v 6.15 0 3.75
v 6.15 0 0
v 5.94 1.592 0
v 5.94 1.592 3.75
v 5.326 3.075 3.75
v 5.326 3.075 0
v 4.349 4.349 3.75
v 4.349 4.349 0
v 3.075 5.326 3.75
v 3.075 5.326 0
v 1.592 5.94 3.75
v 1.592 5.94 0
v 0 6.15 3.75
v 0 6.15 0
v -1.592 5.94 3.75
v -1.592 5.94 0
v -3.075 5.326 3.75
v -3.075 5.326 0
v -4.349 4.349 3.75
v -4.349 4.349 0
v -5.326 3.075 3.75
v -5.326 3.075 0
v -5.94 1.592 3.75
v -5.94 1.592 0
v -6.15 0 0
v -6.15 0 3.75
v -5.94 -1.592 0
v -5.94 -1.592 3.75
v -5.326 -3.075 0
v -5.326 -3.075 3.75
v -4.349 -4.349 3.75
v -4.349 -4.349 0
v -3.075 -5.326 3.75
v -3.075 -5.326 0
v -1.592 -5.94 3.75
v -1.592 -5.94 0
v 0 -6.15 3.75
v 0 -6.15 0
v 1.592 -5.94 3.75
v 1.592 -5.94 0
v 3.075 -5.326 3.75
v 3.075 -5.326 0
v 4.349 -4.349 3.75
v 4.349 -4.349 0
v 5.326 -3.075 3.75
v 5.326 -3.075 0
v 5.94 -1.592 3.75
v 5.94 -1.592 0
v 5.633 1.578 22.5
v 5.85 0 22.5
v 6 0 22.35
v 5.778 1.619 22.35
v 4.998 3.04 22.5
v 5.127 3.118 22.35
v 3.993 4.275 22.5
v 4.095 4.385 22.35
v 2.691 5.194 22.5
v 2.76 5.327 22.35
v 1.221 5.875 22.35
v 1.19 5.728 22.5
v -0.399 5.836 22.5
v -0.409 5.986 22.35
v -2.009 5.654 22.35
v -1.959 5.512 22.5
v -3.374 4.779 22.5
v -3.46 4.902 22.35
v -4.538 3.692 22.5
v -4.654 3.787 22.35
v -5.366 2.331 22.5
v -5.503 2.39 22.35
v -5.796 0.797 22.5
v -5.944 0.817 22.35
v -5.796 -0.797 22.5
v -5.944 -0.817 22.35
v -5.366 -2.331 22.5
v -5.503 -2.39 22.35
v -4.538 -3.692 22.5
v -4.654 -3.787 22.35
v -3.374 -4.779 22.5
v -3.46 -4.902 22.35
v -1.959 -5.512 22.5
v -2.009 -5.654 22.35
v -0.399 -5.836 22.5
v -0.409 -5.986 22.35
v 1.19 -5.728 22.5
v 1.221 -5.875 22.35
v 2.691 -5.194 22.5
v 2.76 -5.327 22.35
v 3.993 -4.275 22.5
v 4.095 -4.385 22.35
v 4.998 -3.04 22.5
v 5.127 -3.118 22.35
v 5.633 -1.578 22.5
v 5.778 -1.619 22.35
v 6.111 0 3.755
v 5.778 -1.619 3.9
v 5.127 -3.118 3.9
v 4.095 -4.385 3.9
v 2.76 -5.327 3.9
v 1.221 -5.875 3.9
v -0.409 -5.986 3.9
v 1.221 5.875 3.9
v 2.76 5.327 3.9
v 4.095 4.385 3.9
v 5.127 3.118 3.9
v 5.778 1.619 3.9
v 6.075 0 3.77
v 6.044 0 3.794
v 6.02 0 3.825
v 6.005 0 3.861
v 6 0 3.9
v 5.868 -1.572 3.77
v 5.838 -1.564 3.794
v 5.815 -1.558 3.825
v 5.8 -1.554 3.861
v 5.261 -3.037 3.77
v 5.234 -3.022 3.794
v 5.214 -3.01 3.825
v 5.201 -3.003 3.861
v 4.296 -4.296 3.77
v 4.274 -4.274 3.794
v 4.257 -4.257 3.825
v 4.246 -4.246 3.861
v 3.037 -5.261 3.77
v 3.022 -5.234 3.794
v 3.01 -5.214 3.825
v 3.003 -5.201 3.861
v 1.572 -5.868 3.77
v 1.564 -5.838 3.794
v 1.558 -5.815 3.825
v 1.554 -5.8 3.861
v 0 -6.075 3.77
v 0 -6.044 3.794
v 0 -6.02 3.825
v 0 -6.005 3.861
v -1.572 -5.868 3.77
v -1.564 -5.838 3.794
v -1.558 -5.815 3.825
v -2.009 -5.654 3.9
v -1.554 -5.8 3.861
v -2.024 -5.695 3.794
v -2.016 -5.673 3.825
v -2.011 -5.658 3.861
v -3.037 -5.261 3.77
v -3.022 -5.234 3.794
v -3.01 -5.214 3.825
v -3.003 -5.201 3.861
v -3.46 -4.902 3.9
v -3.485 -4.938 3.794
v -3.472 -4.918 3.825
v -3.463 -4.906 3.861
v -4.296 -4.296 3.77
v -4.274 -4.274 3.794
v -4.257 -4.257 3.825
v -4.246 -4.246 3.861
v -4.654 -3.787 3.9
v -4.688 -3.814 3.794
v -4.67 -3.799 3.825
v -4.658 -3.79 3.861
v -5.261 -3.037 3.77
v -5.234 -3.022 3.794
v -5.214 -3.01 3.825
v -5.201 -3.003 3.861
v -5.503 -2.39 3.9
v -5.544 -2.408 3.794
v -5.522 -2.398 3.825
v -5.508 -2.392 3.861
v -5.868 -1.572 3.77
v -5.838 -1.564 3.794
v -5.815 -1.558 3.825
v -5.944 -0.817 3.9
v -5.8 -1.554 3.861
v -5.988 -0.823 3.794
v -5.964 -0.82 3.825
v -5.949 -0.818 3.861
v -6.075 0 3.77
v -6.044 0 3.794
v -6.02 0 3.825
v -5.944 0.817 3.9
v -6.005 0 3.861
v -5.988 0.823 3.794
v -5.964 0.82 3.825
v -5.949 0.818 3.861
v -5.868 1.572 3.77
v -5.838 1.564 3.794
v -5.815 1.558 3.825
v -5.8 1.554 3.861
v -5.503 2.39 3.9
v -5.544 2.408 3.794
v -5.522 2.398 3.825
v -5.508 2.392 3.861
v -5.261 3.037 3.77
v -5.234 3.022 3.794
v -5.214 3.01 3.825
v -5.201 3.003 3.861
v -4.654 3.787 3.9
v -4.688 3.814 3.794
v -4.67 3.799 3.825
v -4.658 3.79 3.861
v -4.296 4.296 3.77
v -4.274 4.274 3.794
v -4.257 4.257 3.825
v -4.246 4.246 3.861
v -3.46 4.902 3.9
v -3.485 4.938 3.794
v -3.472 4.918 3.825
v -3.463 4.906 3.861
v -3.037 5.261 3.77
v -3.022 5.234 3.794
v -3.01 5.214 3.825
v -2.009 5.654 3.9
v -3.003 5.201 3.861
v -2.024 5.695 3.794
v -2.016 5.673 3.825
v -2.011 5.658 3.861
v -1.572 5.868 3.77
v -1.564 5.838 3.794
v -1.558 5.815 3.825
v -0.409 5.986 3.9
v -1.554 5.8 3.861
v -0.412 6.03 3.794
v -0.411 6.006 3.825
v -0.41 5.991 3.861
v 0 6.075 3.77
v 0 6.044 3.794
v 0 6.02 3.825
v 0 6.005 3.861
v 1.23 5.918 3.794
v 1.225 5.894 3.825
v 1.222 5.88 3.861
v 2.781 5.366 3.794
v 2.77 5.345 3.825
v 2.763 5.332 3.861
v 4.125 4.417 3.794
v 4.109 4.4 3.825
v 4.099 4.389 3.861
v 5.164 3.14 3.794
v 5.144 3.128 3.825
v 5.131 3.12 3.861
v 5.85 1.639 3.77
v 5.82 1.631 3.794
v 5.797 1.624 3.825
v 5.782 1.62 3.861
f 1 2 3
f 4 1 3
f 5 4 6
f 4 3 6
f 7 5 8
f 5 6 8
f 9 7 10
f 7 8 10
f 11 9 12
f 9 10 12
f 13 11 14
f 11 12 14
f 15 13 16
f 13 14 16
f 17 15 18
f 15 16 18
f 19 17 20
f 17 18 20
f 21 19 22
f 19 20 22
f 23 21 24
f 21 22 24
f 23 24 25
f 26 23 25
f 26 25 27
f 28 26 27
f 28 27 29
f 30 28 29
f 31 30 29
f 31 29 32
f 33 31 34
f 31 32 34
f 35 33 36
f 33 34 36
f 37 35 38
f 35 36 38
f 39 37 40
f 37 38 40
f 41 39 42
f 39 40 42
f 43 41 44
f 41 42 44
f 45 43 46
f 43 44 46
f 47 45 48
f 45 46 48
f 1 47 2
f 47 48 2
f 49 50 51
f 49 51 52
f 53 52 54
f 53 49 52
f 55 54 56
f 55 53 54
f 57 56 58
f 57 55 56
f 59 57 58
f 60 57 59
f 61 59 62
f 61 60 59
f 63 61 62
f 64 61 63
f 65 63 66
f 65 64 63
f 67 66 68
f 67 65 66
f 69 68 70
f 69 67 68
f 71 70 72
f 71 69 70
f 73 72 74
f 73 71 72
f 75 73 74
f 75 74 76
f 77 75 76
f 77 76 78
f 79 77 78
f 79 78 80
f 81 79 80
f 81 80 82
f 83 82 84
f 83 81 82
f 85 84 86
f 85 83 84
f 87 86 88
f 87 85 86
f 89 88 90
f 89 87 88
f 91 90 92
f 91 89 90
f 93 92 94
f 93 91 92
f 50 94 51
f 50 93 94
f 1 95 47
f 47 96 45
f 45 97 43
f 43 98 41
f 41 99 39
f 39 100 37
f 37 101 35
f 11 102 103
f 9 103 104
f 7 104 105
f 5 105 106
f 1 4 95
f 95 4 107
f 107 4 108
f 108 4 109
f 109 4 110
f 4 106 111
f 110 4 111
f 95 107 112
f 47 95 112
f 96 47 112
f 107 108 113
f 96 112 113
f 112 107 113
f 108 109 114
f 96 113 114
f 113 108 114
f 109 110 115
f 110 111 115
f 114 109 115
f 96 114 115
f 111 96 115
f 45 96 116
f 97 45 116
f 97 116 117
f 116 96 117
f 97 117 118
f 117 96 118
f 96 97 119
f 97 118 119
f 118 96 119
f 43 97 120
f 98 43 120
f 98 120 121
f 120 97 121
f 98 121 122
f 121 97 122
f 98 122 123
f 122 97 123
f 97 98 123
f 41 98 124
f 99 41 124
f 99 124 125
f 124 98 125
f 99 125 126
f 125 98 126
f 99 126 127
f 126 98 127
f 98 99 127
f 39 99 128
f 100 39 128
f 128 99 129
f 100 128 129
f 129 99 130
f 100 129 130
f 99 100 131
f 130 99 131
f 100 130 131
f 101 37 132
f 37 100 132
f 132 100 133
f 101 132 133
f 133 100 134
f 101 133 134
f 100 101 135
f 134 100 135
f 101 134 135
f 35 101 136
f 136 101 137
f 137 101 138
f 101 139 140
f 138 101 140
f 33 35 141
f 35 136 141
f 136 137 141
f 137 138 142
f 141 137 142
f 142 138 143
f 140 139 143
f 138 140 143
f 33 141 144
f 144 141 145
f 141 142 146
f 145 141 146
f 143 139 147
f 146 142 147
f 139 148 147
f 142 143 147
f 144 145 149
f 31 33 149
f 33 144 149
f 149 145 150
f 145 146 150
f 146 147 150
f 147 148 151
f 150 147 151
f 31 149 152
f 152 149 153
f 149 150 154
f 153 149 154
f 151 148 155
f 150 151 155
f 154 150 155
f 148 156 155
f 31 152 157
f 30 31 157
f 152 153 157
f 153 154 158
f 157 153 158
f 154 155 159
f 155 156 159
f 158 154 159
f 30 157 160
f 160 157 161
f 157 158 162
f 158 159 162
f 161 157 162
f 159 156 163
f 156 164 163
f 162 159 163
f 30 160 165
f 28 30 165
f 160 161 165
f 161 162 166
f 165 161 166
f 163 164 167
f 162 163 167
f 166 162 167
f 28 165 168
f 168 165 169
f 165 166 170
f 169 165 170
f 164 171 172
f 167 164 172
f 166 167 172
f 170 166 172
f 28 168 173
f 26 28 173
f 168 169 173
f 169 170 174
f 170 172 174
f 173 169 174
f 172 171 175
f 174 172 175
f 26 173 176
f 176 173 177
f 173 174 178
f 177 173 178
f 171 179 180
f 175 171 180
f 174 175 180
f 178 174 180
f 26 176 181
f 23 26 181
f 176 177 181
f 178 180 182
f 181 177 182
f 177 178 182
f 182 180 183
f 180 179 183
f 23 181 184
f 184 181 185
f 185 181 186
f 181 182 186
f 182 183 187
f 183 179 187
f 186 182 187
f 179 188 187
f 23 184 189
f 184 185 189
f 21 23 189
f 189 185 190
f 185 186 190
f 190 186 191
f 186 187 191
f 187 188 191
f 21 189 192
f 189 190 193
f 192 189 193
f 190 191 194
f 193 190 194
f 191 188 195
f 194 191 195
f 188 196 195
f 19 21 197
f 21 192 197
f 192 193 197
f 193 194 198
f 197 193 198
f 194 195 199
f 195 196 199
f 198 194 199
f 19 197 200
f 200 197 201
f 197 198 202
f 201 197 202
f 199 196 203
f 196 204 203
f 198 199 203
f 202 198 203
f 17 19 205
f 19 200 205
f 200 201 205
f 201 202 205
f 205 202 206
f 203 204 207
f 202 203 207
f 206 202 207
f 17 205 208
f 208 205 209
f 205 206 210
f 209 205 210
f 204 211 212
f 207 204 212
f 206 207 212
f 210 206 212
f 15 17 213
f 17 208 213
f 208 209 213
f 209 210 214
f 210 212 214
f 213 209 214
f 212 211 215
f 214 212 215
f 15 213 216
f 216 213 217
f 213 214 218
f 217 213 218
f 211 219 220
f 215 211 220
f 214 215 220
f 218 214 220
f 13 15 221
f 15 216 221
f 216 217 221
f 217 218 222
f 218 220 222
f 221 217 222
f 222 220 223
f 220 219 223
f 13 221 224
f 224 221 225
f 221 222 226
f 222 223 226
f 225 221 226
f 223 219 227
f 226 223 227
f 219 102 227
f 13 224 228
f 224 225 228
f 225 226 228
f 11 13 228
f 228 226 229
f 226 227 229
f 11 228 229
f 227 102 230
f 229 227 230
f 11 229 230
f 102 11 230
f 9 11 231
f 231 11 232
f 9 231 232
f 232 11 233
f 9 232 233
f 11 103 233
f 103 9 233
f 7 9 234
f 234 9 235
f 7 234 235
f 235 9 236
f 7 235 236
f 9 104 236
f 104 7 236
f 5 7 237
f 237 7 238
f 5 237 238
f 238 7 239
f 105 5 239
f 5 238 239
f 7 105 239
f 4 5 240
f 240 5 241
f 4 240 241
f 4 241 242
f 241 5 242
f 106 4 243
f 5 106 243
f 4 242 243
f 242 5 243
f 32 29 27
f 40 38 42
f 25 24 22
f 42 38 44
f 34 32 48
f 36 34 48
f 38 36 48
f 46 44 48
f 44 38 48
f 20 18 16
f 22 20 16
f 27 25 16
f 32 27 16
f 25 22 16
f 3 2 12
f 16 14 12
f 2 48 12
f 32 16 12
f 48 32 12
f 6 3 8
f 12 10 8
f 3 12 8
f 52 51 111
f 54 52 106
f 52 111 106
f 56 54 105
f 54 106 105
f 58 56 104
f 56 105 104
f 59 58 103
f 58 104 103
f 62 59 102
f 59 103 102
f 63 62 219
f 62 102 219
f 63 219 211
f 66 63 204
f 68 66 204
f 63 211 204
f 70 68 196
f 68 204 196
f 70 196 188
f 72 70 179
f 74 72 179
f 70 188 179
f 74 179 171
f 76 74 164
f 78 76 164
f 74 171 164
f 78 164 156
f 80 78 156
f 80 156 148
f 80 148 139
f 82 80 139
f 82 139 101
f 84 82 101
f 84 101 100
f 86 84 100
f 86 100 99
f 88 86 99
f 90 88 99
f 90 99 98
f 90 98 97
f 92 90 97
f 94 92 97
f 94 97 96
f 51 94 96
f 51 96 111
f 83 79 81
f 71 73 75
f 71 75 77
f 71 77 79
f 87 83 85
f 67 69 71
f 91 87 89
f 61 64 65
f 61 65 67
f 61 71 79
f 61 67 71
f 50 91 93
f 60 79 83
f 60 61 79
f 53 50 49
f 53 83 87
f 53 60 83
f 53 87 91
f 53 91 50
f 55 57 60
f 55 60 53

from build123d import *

# Parameters (mm, degrees)
F0_R     = 6
F1_DEPTH = 22.5
F2_R     = 6.15
F3_DEPTH = 3.75
F4_R     = 0.14999
F5_SIZE2 = 0.15
F5_SIZE  = 0.15


# Not quite as in the source:
# - a fillet or chamfer is up to 0.001 mm smaller than in the source, because OpenCascade refuses the exact size


with BuildPart() as f1:
    # F0 (on Top) → F1 (new body)
    with BuildSketch(Plane.XY):
        Circle(F0_R)
    extrude(amount=F1_DEPTH)

    # F2 (on Top) → F3 (join)
    with BuildSketch(Plane.XY):
        Circle(F2_R)
    extrude(amount=F3_DEPTH)

    # F4 (radius 0.15 in the source; OpenCascade refuses exactly that, so slightly less here)
    f4_edges = [f1.edges().sort_by_distance(p)[0] for p in [
        (-6, 0, 3.75),
    ]]
    fillet(f4_edges, radius=F4_R)

    # F5
    f5_edges = [f1.edges().sort_by_distance(p)[0] for p in [
        (-6, 0, 22.5),
    ]]
    chamfer(f5_edges, length=F5_SIZE, length2=F5_SIZE2)


solid = f1.part
